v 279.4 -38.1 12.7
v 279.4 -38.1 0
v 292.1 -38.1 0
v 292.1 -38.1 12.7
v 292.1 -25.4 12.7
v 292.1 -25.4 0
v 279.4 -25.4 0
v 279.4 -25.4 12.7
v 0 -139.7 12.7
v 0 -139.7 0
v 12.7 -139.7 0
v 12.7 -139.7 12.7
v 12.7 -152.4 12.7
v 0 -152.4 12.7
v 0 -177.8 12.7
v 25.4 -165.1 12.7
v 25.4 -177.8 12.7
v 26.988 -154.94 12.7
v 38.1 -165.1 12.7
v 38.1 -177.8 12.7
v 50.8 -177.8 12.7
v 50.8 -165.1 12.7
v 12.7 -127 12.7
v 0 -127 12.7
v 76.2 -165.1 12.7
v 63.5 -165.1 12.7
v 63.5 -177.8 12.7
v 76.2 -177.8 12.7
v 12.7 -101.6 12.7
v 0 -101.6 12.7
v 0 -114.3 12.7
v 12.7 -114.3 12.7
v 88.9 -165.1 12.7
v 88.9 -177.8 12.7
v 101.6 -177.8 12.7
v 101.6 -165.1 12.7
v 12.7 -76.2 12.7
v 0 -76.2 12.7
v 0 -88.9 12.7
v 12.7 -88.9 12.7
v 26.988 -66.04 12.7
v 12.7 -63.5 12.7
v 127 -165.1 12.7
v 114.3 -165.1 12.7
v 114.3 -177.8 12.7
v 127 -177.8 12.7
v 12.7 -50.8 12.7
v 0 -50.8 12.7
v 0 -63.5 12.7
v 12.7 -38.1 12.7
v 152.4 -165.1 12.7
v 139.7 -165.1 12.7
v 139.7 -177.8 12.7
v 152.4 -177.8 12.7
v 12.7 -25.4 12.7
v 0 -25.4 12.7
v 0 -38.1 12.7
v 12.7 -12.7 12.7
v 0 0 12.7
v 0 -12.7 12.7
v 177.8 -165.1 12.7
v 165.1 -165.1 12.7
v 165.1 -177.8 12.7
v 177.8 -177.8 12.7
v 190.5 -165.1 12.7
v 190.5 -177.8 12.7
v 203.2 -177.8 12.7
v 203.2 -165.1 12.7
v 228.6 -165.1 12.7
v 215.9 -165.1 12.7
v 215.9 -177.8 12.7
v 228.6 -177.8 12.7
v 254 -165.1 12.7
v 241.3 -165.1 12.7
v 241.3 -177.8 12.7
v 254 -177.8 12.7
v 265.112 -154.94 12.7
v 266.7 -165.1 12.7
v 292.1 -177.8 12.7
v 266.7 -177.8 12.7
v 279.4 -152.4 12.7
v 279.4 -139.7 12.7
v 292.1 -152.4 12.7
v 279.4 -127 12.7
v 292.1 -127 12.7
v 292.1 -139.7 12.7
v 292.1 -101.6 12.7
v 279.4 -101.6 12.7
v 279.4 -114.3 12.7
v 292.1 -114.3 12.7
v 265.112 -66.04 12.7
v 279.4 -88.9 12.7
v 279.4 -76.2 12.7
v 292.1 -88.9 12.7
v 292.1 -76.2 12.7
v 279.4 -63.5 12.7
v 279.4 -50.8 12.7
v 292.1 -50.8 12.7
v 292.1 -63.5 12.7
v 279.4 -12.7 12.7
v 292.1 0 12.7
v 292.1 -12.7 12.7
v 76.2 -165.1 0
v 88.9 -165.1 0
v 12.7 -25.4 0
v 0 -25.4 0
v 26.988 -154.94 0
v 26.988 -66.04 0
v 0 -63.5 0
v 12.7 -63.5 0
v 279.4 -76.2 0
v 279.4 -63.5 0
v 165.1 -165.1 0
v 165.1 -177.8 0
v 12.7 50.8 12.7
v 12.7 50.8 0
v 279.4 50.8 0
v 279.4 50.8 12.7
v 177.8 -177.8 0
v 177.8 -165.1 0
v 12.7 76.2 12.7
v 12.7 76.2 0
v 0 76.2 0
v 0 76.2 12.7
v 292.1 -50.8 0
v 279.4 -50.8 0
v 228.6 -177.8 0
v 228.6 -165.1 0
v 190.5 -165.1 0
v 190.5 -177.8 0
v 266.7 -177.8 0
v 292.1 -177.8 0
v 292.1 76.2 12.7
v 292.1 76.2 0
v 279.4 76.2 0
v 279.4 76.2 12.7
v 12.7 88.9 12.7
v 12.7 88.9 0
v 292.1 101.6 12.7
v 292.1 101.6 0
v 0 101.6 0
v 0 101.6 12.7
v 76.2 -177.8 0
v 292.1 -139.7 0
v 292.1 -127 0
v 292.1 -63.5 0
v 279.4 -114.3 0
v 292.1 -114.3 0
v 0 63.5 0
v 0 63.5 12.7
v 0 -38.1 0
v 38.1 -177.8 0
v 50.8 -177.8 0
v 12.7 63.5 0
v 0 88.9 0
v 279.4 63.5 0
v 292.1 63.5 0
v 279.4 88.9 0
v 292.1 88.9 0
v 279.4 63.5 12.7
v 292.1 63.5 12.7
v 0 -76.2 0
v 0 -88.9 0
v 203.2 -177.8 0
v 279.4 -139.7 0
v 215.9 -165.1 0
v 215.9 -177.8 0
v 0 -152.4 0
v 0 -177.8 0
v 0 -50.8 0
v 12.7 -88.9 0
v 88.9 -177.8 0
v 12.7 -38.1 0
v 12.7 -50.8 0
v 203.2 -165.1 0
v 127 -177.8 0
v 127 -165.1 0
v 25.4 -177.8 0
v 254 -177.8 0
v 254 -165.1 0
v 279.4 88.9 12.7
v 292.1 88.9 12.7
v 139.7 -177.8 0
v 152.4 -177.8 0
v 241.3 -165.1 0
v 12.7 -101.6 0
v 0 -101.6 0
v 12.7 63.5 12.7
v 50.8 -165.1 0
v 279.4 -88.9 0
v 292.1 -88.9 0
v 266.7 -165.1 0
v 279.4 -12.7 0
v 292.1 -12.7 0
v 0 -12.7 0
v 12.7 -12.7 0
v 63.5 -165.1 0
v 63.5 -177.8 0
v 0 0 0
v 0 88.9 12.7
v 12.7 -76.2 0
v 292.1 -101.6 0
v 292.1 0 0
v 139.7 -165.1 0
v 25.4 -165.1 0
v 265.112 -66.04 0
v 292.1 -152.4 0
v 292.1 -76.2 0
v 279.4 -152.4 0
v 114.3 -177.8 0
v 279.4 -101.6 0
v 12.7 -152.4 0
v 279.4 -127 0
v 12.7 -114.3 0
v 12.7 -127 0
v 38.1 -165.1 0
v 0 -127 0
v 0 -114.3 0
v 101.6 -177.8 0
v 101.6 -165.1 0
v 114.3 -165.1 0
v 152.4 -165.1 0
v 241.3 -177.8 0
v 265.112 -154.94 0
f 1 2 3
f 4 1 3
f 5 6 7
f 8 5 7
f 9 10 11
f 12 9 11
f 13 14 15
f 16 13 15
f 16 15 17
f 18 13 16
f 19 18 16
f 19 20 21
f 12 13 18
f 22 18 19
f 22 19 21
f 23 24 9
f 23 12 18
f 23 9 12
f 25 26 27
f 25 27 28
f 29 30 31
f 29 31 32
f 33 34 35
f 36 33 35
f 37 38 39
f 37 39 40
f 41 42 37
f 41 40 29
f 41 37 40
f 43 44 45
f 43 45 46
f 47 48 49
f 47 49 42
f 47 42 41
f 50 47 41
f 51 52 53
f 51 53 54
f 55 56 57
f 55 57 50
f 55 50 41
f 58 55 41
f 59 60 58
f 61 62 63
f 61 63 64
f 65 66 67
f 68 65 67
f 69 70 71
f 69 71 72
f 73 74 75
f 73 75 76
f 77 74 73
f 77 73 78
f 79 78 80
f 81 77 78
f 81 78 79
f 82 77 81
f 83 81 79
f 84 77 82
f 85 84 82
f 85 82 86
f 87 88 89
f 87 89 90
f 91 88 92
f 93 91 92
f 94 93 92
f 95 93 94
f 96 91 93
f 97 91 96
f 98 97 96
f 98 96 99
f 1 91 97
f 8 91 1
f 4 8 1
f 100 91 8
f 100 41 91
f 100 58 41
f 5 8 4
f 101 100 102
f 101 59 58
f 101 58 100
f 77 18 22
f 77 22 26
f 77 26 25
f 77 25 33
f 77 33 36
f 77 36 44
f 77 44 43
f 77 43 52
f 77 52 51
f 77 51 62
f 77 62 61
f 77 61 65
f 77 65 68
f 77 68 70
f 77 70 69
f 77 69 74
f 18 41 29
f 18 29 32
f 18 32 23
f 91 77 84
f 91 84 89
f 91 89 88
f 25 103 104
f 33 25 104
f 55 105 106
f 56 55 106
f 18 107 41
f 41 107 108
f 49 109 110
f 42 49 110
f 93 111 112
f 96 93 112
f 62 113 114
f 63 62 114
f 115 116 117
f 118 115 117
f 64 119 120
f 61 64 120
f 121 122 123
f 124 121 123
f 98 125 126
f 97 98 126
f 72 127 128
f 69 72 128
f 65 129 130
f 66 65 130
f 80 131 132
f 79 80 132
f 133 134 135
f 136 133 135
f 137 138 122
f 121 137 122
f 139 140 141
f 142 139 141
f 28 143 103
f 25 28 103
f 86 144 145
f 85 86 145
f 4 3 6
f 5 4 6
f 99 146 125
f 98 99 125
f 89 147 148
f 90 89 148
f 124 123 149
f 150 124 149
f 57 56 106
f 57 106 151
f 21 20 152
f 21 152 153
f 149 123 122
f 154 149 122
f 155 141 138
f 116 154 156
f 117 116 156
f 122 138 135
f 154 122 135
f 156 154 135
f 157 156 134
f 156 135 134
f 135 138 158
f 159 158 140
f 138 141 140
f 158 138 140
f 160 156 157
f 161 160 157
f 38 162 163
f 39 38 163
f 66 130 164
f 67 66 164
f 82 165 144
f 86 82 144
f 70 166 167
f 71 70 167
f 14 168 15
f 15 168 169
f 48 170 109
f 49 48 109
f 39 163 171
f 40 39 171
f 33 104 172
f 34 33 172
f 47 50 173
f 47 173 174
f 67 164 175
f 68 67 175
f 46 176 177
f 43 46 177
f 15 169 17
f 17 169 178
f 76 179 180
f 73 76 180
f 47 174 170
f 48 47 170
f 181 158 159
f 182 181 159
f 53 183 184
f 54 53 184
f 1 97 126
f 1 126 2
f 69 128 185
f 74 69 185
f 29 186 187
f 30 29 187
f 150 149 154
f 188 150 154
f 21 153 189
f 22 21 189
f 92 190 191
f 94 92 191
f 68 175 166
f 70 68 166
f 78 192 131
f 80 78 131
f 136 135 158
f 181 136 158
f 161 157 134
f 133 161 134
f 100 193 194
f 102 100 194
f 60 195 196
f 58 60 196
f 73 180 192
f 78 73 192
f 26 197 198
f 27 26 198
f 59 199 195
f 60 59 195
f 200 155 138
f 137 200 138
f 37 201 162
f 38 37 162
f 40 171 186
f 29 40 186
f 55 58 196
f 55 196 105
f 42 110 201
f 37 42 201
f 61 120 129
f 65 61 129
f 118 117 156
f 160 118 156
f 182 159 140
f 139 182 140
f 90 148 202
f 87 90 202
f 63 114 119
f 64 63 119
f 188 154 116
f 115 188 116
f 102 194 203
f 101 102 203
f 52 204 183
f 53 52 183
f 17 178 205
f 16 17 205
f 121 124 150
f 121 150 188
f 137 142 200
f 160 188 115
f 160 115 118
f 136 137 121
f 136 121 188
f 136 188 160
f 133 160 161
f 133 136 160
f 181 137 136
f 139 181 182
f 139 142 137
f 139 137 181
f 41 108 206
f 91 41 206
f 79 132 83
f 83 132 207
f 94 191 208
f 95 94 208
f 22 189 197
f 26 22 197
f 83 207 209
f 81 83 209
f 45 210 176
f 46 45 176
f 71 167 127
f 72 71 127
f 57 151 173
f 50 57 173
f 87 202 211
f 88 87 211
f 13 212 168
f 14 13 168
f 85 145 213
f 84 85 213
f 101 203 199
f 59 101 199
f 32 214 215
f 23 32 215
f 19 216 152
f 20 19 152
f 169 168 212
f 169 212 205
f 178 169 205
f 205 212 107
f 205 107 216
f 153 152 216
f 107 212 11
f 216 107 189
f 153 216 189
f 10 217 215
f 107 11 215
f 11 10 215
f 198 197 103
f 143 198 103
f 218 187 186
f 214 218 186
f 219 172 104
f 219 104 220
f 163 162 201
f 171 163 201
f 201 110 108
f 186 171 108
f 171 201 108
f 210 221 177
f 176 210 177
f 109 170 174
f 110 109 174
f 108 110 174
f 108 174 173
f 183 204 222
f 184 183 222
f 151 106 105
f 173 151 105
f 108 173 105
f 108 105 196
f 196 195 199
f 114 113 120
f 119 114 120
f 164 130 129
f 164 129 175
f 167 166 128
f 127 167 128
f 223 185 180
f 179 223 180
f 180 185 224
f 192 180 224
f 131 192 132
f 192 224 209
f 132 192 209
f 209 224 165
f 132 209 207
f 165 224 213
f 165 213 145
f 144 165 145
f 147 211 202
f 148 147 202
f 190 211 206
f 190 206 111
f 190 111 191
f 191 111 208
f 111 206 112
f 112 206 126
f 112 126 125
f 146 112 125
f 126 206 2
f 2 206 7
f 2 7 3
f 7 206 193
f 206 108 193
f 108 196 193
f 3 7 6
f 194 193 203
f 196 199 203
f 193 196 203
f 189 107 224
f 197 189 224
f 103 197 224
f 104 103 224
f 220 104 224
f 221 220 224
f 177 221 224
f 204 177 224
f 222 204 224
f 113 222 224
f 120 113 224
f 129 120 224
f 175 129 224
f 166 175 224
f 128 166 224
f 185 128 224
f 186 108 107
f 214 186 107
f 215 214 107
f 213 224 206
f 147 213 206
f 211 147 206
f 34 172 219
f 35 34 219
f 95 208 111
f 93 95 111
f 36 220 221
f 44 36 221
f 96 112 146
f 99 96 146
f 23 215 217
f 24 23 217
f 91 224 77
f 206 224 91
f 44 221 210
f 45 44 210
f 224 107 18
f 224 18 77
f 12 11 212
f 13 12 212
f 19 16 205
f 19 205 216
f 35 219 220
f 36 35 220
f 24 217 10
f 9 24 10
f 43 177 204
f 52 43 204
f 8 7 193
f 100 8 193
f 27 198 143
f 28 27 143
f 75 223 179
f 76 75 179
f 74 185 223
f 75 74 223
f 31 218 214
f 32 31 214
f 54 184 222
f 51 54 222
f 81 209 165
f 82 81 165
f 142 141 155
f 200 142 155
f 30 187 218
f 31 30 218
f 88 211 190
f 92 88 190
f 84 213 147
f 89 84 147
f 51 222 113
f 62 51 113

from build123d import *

# Parameters (mm, degrees)
F0_W     = 238.125
F0_H     = 88.9
F1_DEPTH = 12.7


with BuildPart() as f1:
    # F0 (on Top) → F1 (new body)
    with BuildSketch(Plane.XY):
        Polygon((292.1, 0), (0, 0), (0, -12.7), (12.7, -12.7), (12.7, -25.4), (0, -25.4), (0, -38.1), (12.7, -38.1), (12.7, -50.8), (0, -50.8), (0, -63.5), (12.7, -63.5), (12.7, -76.2), (0, -76.2), (0, -88.9), (12.7, -88.9), (12.7, -101.6), (0, -101.6), (0, -114.3), (12.7, -114.3), (12.7, -127), (0, -127), (0, -139.7), (12.7, -139.7), (12.7, -152.4), (0, -152.4), (0, -177.8), (25.4, -177.8), (25.4, -165.1), (38.1, -165.1), (38.1, -177.8), (50.8, -177.8), (50.8, -165.1), (63.5, -165.1), (63.5, -177.8), (76.2, -177.8), (76.2, -165.1), (88.9, -165.1), (88.9, -177.8), (101.6, -177.8), (101.6, -165.1), (114.3, -165.1), (114.3, -177.8), (127, -177.8), (127, -165.1), (139.7, -165.1), (139.7, -177.8), (152.4, -177.8), (152.4, -165.1), (165.1, -165.1), (165.1, -177.8), (177.8, -177.8), (177.8, -165.1), (190.5, -165.1), (190.5, -177.8), (203.2, -177.8), (203.2, -165.1), (215.9, -165.1), (215.9, -177.8), (228.6, -177.8), (228.6, -165.1), (241.3, -165.1), (241.3, -177.8), (254, -177.8), (254, -165.1), (266.7, -165.1), (266.7, -177.8), (292.1, -177.8), (292.1, -152.4), (279.4, -152.4), (279.4, -139.7), (292.1, -139.7), (292.1, -127), (279.4, -127), (279.4, -114.3), (292.1, -114.3), (292.1, -101.6), (279.4, -101.6), (279.4, -88.9), (292.1, -88.9), (292.1, -76.2), (279.4, -76.2), (279.4, -63.5), (292.1, -63.5), (292.1, -50.8), (279.4, -50.8), (279.4, -38.1), (292.1, -38.1), (292.1, -25.4), (279.4, -25.4), (279.4, -12.7), (292.1, -12.7), align=None)
        with Locations((146.05, -110.49)):
            Rectangle(F0_W, F0_H, mode=Mode.SUBTRACT)
        Polygon((292.1, 101.6), (0, 101.6), (0, 88.9), (12.7, 88.9), (12.7, 76.2), (0, 76.2), (0, 63.5), (12.7, 63.5), (12.7, 50.8), (279.4, 50.8), (279.4, 63.5), (292.1, 63.5), (292.1, 76.2), (279.4, 76.2), (279.4, 88.9), (292.1, 88.9), align=None)
    extrude(amount=F1_DEPTH)


solid = f1.part
